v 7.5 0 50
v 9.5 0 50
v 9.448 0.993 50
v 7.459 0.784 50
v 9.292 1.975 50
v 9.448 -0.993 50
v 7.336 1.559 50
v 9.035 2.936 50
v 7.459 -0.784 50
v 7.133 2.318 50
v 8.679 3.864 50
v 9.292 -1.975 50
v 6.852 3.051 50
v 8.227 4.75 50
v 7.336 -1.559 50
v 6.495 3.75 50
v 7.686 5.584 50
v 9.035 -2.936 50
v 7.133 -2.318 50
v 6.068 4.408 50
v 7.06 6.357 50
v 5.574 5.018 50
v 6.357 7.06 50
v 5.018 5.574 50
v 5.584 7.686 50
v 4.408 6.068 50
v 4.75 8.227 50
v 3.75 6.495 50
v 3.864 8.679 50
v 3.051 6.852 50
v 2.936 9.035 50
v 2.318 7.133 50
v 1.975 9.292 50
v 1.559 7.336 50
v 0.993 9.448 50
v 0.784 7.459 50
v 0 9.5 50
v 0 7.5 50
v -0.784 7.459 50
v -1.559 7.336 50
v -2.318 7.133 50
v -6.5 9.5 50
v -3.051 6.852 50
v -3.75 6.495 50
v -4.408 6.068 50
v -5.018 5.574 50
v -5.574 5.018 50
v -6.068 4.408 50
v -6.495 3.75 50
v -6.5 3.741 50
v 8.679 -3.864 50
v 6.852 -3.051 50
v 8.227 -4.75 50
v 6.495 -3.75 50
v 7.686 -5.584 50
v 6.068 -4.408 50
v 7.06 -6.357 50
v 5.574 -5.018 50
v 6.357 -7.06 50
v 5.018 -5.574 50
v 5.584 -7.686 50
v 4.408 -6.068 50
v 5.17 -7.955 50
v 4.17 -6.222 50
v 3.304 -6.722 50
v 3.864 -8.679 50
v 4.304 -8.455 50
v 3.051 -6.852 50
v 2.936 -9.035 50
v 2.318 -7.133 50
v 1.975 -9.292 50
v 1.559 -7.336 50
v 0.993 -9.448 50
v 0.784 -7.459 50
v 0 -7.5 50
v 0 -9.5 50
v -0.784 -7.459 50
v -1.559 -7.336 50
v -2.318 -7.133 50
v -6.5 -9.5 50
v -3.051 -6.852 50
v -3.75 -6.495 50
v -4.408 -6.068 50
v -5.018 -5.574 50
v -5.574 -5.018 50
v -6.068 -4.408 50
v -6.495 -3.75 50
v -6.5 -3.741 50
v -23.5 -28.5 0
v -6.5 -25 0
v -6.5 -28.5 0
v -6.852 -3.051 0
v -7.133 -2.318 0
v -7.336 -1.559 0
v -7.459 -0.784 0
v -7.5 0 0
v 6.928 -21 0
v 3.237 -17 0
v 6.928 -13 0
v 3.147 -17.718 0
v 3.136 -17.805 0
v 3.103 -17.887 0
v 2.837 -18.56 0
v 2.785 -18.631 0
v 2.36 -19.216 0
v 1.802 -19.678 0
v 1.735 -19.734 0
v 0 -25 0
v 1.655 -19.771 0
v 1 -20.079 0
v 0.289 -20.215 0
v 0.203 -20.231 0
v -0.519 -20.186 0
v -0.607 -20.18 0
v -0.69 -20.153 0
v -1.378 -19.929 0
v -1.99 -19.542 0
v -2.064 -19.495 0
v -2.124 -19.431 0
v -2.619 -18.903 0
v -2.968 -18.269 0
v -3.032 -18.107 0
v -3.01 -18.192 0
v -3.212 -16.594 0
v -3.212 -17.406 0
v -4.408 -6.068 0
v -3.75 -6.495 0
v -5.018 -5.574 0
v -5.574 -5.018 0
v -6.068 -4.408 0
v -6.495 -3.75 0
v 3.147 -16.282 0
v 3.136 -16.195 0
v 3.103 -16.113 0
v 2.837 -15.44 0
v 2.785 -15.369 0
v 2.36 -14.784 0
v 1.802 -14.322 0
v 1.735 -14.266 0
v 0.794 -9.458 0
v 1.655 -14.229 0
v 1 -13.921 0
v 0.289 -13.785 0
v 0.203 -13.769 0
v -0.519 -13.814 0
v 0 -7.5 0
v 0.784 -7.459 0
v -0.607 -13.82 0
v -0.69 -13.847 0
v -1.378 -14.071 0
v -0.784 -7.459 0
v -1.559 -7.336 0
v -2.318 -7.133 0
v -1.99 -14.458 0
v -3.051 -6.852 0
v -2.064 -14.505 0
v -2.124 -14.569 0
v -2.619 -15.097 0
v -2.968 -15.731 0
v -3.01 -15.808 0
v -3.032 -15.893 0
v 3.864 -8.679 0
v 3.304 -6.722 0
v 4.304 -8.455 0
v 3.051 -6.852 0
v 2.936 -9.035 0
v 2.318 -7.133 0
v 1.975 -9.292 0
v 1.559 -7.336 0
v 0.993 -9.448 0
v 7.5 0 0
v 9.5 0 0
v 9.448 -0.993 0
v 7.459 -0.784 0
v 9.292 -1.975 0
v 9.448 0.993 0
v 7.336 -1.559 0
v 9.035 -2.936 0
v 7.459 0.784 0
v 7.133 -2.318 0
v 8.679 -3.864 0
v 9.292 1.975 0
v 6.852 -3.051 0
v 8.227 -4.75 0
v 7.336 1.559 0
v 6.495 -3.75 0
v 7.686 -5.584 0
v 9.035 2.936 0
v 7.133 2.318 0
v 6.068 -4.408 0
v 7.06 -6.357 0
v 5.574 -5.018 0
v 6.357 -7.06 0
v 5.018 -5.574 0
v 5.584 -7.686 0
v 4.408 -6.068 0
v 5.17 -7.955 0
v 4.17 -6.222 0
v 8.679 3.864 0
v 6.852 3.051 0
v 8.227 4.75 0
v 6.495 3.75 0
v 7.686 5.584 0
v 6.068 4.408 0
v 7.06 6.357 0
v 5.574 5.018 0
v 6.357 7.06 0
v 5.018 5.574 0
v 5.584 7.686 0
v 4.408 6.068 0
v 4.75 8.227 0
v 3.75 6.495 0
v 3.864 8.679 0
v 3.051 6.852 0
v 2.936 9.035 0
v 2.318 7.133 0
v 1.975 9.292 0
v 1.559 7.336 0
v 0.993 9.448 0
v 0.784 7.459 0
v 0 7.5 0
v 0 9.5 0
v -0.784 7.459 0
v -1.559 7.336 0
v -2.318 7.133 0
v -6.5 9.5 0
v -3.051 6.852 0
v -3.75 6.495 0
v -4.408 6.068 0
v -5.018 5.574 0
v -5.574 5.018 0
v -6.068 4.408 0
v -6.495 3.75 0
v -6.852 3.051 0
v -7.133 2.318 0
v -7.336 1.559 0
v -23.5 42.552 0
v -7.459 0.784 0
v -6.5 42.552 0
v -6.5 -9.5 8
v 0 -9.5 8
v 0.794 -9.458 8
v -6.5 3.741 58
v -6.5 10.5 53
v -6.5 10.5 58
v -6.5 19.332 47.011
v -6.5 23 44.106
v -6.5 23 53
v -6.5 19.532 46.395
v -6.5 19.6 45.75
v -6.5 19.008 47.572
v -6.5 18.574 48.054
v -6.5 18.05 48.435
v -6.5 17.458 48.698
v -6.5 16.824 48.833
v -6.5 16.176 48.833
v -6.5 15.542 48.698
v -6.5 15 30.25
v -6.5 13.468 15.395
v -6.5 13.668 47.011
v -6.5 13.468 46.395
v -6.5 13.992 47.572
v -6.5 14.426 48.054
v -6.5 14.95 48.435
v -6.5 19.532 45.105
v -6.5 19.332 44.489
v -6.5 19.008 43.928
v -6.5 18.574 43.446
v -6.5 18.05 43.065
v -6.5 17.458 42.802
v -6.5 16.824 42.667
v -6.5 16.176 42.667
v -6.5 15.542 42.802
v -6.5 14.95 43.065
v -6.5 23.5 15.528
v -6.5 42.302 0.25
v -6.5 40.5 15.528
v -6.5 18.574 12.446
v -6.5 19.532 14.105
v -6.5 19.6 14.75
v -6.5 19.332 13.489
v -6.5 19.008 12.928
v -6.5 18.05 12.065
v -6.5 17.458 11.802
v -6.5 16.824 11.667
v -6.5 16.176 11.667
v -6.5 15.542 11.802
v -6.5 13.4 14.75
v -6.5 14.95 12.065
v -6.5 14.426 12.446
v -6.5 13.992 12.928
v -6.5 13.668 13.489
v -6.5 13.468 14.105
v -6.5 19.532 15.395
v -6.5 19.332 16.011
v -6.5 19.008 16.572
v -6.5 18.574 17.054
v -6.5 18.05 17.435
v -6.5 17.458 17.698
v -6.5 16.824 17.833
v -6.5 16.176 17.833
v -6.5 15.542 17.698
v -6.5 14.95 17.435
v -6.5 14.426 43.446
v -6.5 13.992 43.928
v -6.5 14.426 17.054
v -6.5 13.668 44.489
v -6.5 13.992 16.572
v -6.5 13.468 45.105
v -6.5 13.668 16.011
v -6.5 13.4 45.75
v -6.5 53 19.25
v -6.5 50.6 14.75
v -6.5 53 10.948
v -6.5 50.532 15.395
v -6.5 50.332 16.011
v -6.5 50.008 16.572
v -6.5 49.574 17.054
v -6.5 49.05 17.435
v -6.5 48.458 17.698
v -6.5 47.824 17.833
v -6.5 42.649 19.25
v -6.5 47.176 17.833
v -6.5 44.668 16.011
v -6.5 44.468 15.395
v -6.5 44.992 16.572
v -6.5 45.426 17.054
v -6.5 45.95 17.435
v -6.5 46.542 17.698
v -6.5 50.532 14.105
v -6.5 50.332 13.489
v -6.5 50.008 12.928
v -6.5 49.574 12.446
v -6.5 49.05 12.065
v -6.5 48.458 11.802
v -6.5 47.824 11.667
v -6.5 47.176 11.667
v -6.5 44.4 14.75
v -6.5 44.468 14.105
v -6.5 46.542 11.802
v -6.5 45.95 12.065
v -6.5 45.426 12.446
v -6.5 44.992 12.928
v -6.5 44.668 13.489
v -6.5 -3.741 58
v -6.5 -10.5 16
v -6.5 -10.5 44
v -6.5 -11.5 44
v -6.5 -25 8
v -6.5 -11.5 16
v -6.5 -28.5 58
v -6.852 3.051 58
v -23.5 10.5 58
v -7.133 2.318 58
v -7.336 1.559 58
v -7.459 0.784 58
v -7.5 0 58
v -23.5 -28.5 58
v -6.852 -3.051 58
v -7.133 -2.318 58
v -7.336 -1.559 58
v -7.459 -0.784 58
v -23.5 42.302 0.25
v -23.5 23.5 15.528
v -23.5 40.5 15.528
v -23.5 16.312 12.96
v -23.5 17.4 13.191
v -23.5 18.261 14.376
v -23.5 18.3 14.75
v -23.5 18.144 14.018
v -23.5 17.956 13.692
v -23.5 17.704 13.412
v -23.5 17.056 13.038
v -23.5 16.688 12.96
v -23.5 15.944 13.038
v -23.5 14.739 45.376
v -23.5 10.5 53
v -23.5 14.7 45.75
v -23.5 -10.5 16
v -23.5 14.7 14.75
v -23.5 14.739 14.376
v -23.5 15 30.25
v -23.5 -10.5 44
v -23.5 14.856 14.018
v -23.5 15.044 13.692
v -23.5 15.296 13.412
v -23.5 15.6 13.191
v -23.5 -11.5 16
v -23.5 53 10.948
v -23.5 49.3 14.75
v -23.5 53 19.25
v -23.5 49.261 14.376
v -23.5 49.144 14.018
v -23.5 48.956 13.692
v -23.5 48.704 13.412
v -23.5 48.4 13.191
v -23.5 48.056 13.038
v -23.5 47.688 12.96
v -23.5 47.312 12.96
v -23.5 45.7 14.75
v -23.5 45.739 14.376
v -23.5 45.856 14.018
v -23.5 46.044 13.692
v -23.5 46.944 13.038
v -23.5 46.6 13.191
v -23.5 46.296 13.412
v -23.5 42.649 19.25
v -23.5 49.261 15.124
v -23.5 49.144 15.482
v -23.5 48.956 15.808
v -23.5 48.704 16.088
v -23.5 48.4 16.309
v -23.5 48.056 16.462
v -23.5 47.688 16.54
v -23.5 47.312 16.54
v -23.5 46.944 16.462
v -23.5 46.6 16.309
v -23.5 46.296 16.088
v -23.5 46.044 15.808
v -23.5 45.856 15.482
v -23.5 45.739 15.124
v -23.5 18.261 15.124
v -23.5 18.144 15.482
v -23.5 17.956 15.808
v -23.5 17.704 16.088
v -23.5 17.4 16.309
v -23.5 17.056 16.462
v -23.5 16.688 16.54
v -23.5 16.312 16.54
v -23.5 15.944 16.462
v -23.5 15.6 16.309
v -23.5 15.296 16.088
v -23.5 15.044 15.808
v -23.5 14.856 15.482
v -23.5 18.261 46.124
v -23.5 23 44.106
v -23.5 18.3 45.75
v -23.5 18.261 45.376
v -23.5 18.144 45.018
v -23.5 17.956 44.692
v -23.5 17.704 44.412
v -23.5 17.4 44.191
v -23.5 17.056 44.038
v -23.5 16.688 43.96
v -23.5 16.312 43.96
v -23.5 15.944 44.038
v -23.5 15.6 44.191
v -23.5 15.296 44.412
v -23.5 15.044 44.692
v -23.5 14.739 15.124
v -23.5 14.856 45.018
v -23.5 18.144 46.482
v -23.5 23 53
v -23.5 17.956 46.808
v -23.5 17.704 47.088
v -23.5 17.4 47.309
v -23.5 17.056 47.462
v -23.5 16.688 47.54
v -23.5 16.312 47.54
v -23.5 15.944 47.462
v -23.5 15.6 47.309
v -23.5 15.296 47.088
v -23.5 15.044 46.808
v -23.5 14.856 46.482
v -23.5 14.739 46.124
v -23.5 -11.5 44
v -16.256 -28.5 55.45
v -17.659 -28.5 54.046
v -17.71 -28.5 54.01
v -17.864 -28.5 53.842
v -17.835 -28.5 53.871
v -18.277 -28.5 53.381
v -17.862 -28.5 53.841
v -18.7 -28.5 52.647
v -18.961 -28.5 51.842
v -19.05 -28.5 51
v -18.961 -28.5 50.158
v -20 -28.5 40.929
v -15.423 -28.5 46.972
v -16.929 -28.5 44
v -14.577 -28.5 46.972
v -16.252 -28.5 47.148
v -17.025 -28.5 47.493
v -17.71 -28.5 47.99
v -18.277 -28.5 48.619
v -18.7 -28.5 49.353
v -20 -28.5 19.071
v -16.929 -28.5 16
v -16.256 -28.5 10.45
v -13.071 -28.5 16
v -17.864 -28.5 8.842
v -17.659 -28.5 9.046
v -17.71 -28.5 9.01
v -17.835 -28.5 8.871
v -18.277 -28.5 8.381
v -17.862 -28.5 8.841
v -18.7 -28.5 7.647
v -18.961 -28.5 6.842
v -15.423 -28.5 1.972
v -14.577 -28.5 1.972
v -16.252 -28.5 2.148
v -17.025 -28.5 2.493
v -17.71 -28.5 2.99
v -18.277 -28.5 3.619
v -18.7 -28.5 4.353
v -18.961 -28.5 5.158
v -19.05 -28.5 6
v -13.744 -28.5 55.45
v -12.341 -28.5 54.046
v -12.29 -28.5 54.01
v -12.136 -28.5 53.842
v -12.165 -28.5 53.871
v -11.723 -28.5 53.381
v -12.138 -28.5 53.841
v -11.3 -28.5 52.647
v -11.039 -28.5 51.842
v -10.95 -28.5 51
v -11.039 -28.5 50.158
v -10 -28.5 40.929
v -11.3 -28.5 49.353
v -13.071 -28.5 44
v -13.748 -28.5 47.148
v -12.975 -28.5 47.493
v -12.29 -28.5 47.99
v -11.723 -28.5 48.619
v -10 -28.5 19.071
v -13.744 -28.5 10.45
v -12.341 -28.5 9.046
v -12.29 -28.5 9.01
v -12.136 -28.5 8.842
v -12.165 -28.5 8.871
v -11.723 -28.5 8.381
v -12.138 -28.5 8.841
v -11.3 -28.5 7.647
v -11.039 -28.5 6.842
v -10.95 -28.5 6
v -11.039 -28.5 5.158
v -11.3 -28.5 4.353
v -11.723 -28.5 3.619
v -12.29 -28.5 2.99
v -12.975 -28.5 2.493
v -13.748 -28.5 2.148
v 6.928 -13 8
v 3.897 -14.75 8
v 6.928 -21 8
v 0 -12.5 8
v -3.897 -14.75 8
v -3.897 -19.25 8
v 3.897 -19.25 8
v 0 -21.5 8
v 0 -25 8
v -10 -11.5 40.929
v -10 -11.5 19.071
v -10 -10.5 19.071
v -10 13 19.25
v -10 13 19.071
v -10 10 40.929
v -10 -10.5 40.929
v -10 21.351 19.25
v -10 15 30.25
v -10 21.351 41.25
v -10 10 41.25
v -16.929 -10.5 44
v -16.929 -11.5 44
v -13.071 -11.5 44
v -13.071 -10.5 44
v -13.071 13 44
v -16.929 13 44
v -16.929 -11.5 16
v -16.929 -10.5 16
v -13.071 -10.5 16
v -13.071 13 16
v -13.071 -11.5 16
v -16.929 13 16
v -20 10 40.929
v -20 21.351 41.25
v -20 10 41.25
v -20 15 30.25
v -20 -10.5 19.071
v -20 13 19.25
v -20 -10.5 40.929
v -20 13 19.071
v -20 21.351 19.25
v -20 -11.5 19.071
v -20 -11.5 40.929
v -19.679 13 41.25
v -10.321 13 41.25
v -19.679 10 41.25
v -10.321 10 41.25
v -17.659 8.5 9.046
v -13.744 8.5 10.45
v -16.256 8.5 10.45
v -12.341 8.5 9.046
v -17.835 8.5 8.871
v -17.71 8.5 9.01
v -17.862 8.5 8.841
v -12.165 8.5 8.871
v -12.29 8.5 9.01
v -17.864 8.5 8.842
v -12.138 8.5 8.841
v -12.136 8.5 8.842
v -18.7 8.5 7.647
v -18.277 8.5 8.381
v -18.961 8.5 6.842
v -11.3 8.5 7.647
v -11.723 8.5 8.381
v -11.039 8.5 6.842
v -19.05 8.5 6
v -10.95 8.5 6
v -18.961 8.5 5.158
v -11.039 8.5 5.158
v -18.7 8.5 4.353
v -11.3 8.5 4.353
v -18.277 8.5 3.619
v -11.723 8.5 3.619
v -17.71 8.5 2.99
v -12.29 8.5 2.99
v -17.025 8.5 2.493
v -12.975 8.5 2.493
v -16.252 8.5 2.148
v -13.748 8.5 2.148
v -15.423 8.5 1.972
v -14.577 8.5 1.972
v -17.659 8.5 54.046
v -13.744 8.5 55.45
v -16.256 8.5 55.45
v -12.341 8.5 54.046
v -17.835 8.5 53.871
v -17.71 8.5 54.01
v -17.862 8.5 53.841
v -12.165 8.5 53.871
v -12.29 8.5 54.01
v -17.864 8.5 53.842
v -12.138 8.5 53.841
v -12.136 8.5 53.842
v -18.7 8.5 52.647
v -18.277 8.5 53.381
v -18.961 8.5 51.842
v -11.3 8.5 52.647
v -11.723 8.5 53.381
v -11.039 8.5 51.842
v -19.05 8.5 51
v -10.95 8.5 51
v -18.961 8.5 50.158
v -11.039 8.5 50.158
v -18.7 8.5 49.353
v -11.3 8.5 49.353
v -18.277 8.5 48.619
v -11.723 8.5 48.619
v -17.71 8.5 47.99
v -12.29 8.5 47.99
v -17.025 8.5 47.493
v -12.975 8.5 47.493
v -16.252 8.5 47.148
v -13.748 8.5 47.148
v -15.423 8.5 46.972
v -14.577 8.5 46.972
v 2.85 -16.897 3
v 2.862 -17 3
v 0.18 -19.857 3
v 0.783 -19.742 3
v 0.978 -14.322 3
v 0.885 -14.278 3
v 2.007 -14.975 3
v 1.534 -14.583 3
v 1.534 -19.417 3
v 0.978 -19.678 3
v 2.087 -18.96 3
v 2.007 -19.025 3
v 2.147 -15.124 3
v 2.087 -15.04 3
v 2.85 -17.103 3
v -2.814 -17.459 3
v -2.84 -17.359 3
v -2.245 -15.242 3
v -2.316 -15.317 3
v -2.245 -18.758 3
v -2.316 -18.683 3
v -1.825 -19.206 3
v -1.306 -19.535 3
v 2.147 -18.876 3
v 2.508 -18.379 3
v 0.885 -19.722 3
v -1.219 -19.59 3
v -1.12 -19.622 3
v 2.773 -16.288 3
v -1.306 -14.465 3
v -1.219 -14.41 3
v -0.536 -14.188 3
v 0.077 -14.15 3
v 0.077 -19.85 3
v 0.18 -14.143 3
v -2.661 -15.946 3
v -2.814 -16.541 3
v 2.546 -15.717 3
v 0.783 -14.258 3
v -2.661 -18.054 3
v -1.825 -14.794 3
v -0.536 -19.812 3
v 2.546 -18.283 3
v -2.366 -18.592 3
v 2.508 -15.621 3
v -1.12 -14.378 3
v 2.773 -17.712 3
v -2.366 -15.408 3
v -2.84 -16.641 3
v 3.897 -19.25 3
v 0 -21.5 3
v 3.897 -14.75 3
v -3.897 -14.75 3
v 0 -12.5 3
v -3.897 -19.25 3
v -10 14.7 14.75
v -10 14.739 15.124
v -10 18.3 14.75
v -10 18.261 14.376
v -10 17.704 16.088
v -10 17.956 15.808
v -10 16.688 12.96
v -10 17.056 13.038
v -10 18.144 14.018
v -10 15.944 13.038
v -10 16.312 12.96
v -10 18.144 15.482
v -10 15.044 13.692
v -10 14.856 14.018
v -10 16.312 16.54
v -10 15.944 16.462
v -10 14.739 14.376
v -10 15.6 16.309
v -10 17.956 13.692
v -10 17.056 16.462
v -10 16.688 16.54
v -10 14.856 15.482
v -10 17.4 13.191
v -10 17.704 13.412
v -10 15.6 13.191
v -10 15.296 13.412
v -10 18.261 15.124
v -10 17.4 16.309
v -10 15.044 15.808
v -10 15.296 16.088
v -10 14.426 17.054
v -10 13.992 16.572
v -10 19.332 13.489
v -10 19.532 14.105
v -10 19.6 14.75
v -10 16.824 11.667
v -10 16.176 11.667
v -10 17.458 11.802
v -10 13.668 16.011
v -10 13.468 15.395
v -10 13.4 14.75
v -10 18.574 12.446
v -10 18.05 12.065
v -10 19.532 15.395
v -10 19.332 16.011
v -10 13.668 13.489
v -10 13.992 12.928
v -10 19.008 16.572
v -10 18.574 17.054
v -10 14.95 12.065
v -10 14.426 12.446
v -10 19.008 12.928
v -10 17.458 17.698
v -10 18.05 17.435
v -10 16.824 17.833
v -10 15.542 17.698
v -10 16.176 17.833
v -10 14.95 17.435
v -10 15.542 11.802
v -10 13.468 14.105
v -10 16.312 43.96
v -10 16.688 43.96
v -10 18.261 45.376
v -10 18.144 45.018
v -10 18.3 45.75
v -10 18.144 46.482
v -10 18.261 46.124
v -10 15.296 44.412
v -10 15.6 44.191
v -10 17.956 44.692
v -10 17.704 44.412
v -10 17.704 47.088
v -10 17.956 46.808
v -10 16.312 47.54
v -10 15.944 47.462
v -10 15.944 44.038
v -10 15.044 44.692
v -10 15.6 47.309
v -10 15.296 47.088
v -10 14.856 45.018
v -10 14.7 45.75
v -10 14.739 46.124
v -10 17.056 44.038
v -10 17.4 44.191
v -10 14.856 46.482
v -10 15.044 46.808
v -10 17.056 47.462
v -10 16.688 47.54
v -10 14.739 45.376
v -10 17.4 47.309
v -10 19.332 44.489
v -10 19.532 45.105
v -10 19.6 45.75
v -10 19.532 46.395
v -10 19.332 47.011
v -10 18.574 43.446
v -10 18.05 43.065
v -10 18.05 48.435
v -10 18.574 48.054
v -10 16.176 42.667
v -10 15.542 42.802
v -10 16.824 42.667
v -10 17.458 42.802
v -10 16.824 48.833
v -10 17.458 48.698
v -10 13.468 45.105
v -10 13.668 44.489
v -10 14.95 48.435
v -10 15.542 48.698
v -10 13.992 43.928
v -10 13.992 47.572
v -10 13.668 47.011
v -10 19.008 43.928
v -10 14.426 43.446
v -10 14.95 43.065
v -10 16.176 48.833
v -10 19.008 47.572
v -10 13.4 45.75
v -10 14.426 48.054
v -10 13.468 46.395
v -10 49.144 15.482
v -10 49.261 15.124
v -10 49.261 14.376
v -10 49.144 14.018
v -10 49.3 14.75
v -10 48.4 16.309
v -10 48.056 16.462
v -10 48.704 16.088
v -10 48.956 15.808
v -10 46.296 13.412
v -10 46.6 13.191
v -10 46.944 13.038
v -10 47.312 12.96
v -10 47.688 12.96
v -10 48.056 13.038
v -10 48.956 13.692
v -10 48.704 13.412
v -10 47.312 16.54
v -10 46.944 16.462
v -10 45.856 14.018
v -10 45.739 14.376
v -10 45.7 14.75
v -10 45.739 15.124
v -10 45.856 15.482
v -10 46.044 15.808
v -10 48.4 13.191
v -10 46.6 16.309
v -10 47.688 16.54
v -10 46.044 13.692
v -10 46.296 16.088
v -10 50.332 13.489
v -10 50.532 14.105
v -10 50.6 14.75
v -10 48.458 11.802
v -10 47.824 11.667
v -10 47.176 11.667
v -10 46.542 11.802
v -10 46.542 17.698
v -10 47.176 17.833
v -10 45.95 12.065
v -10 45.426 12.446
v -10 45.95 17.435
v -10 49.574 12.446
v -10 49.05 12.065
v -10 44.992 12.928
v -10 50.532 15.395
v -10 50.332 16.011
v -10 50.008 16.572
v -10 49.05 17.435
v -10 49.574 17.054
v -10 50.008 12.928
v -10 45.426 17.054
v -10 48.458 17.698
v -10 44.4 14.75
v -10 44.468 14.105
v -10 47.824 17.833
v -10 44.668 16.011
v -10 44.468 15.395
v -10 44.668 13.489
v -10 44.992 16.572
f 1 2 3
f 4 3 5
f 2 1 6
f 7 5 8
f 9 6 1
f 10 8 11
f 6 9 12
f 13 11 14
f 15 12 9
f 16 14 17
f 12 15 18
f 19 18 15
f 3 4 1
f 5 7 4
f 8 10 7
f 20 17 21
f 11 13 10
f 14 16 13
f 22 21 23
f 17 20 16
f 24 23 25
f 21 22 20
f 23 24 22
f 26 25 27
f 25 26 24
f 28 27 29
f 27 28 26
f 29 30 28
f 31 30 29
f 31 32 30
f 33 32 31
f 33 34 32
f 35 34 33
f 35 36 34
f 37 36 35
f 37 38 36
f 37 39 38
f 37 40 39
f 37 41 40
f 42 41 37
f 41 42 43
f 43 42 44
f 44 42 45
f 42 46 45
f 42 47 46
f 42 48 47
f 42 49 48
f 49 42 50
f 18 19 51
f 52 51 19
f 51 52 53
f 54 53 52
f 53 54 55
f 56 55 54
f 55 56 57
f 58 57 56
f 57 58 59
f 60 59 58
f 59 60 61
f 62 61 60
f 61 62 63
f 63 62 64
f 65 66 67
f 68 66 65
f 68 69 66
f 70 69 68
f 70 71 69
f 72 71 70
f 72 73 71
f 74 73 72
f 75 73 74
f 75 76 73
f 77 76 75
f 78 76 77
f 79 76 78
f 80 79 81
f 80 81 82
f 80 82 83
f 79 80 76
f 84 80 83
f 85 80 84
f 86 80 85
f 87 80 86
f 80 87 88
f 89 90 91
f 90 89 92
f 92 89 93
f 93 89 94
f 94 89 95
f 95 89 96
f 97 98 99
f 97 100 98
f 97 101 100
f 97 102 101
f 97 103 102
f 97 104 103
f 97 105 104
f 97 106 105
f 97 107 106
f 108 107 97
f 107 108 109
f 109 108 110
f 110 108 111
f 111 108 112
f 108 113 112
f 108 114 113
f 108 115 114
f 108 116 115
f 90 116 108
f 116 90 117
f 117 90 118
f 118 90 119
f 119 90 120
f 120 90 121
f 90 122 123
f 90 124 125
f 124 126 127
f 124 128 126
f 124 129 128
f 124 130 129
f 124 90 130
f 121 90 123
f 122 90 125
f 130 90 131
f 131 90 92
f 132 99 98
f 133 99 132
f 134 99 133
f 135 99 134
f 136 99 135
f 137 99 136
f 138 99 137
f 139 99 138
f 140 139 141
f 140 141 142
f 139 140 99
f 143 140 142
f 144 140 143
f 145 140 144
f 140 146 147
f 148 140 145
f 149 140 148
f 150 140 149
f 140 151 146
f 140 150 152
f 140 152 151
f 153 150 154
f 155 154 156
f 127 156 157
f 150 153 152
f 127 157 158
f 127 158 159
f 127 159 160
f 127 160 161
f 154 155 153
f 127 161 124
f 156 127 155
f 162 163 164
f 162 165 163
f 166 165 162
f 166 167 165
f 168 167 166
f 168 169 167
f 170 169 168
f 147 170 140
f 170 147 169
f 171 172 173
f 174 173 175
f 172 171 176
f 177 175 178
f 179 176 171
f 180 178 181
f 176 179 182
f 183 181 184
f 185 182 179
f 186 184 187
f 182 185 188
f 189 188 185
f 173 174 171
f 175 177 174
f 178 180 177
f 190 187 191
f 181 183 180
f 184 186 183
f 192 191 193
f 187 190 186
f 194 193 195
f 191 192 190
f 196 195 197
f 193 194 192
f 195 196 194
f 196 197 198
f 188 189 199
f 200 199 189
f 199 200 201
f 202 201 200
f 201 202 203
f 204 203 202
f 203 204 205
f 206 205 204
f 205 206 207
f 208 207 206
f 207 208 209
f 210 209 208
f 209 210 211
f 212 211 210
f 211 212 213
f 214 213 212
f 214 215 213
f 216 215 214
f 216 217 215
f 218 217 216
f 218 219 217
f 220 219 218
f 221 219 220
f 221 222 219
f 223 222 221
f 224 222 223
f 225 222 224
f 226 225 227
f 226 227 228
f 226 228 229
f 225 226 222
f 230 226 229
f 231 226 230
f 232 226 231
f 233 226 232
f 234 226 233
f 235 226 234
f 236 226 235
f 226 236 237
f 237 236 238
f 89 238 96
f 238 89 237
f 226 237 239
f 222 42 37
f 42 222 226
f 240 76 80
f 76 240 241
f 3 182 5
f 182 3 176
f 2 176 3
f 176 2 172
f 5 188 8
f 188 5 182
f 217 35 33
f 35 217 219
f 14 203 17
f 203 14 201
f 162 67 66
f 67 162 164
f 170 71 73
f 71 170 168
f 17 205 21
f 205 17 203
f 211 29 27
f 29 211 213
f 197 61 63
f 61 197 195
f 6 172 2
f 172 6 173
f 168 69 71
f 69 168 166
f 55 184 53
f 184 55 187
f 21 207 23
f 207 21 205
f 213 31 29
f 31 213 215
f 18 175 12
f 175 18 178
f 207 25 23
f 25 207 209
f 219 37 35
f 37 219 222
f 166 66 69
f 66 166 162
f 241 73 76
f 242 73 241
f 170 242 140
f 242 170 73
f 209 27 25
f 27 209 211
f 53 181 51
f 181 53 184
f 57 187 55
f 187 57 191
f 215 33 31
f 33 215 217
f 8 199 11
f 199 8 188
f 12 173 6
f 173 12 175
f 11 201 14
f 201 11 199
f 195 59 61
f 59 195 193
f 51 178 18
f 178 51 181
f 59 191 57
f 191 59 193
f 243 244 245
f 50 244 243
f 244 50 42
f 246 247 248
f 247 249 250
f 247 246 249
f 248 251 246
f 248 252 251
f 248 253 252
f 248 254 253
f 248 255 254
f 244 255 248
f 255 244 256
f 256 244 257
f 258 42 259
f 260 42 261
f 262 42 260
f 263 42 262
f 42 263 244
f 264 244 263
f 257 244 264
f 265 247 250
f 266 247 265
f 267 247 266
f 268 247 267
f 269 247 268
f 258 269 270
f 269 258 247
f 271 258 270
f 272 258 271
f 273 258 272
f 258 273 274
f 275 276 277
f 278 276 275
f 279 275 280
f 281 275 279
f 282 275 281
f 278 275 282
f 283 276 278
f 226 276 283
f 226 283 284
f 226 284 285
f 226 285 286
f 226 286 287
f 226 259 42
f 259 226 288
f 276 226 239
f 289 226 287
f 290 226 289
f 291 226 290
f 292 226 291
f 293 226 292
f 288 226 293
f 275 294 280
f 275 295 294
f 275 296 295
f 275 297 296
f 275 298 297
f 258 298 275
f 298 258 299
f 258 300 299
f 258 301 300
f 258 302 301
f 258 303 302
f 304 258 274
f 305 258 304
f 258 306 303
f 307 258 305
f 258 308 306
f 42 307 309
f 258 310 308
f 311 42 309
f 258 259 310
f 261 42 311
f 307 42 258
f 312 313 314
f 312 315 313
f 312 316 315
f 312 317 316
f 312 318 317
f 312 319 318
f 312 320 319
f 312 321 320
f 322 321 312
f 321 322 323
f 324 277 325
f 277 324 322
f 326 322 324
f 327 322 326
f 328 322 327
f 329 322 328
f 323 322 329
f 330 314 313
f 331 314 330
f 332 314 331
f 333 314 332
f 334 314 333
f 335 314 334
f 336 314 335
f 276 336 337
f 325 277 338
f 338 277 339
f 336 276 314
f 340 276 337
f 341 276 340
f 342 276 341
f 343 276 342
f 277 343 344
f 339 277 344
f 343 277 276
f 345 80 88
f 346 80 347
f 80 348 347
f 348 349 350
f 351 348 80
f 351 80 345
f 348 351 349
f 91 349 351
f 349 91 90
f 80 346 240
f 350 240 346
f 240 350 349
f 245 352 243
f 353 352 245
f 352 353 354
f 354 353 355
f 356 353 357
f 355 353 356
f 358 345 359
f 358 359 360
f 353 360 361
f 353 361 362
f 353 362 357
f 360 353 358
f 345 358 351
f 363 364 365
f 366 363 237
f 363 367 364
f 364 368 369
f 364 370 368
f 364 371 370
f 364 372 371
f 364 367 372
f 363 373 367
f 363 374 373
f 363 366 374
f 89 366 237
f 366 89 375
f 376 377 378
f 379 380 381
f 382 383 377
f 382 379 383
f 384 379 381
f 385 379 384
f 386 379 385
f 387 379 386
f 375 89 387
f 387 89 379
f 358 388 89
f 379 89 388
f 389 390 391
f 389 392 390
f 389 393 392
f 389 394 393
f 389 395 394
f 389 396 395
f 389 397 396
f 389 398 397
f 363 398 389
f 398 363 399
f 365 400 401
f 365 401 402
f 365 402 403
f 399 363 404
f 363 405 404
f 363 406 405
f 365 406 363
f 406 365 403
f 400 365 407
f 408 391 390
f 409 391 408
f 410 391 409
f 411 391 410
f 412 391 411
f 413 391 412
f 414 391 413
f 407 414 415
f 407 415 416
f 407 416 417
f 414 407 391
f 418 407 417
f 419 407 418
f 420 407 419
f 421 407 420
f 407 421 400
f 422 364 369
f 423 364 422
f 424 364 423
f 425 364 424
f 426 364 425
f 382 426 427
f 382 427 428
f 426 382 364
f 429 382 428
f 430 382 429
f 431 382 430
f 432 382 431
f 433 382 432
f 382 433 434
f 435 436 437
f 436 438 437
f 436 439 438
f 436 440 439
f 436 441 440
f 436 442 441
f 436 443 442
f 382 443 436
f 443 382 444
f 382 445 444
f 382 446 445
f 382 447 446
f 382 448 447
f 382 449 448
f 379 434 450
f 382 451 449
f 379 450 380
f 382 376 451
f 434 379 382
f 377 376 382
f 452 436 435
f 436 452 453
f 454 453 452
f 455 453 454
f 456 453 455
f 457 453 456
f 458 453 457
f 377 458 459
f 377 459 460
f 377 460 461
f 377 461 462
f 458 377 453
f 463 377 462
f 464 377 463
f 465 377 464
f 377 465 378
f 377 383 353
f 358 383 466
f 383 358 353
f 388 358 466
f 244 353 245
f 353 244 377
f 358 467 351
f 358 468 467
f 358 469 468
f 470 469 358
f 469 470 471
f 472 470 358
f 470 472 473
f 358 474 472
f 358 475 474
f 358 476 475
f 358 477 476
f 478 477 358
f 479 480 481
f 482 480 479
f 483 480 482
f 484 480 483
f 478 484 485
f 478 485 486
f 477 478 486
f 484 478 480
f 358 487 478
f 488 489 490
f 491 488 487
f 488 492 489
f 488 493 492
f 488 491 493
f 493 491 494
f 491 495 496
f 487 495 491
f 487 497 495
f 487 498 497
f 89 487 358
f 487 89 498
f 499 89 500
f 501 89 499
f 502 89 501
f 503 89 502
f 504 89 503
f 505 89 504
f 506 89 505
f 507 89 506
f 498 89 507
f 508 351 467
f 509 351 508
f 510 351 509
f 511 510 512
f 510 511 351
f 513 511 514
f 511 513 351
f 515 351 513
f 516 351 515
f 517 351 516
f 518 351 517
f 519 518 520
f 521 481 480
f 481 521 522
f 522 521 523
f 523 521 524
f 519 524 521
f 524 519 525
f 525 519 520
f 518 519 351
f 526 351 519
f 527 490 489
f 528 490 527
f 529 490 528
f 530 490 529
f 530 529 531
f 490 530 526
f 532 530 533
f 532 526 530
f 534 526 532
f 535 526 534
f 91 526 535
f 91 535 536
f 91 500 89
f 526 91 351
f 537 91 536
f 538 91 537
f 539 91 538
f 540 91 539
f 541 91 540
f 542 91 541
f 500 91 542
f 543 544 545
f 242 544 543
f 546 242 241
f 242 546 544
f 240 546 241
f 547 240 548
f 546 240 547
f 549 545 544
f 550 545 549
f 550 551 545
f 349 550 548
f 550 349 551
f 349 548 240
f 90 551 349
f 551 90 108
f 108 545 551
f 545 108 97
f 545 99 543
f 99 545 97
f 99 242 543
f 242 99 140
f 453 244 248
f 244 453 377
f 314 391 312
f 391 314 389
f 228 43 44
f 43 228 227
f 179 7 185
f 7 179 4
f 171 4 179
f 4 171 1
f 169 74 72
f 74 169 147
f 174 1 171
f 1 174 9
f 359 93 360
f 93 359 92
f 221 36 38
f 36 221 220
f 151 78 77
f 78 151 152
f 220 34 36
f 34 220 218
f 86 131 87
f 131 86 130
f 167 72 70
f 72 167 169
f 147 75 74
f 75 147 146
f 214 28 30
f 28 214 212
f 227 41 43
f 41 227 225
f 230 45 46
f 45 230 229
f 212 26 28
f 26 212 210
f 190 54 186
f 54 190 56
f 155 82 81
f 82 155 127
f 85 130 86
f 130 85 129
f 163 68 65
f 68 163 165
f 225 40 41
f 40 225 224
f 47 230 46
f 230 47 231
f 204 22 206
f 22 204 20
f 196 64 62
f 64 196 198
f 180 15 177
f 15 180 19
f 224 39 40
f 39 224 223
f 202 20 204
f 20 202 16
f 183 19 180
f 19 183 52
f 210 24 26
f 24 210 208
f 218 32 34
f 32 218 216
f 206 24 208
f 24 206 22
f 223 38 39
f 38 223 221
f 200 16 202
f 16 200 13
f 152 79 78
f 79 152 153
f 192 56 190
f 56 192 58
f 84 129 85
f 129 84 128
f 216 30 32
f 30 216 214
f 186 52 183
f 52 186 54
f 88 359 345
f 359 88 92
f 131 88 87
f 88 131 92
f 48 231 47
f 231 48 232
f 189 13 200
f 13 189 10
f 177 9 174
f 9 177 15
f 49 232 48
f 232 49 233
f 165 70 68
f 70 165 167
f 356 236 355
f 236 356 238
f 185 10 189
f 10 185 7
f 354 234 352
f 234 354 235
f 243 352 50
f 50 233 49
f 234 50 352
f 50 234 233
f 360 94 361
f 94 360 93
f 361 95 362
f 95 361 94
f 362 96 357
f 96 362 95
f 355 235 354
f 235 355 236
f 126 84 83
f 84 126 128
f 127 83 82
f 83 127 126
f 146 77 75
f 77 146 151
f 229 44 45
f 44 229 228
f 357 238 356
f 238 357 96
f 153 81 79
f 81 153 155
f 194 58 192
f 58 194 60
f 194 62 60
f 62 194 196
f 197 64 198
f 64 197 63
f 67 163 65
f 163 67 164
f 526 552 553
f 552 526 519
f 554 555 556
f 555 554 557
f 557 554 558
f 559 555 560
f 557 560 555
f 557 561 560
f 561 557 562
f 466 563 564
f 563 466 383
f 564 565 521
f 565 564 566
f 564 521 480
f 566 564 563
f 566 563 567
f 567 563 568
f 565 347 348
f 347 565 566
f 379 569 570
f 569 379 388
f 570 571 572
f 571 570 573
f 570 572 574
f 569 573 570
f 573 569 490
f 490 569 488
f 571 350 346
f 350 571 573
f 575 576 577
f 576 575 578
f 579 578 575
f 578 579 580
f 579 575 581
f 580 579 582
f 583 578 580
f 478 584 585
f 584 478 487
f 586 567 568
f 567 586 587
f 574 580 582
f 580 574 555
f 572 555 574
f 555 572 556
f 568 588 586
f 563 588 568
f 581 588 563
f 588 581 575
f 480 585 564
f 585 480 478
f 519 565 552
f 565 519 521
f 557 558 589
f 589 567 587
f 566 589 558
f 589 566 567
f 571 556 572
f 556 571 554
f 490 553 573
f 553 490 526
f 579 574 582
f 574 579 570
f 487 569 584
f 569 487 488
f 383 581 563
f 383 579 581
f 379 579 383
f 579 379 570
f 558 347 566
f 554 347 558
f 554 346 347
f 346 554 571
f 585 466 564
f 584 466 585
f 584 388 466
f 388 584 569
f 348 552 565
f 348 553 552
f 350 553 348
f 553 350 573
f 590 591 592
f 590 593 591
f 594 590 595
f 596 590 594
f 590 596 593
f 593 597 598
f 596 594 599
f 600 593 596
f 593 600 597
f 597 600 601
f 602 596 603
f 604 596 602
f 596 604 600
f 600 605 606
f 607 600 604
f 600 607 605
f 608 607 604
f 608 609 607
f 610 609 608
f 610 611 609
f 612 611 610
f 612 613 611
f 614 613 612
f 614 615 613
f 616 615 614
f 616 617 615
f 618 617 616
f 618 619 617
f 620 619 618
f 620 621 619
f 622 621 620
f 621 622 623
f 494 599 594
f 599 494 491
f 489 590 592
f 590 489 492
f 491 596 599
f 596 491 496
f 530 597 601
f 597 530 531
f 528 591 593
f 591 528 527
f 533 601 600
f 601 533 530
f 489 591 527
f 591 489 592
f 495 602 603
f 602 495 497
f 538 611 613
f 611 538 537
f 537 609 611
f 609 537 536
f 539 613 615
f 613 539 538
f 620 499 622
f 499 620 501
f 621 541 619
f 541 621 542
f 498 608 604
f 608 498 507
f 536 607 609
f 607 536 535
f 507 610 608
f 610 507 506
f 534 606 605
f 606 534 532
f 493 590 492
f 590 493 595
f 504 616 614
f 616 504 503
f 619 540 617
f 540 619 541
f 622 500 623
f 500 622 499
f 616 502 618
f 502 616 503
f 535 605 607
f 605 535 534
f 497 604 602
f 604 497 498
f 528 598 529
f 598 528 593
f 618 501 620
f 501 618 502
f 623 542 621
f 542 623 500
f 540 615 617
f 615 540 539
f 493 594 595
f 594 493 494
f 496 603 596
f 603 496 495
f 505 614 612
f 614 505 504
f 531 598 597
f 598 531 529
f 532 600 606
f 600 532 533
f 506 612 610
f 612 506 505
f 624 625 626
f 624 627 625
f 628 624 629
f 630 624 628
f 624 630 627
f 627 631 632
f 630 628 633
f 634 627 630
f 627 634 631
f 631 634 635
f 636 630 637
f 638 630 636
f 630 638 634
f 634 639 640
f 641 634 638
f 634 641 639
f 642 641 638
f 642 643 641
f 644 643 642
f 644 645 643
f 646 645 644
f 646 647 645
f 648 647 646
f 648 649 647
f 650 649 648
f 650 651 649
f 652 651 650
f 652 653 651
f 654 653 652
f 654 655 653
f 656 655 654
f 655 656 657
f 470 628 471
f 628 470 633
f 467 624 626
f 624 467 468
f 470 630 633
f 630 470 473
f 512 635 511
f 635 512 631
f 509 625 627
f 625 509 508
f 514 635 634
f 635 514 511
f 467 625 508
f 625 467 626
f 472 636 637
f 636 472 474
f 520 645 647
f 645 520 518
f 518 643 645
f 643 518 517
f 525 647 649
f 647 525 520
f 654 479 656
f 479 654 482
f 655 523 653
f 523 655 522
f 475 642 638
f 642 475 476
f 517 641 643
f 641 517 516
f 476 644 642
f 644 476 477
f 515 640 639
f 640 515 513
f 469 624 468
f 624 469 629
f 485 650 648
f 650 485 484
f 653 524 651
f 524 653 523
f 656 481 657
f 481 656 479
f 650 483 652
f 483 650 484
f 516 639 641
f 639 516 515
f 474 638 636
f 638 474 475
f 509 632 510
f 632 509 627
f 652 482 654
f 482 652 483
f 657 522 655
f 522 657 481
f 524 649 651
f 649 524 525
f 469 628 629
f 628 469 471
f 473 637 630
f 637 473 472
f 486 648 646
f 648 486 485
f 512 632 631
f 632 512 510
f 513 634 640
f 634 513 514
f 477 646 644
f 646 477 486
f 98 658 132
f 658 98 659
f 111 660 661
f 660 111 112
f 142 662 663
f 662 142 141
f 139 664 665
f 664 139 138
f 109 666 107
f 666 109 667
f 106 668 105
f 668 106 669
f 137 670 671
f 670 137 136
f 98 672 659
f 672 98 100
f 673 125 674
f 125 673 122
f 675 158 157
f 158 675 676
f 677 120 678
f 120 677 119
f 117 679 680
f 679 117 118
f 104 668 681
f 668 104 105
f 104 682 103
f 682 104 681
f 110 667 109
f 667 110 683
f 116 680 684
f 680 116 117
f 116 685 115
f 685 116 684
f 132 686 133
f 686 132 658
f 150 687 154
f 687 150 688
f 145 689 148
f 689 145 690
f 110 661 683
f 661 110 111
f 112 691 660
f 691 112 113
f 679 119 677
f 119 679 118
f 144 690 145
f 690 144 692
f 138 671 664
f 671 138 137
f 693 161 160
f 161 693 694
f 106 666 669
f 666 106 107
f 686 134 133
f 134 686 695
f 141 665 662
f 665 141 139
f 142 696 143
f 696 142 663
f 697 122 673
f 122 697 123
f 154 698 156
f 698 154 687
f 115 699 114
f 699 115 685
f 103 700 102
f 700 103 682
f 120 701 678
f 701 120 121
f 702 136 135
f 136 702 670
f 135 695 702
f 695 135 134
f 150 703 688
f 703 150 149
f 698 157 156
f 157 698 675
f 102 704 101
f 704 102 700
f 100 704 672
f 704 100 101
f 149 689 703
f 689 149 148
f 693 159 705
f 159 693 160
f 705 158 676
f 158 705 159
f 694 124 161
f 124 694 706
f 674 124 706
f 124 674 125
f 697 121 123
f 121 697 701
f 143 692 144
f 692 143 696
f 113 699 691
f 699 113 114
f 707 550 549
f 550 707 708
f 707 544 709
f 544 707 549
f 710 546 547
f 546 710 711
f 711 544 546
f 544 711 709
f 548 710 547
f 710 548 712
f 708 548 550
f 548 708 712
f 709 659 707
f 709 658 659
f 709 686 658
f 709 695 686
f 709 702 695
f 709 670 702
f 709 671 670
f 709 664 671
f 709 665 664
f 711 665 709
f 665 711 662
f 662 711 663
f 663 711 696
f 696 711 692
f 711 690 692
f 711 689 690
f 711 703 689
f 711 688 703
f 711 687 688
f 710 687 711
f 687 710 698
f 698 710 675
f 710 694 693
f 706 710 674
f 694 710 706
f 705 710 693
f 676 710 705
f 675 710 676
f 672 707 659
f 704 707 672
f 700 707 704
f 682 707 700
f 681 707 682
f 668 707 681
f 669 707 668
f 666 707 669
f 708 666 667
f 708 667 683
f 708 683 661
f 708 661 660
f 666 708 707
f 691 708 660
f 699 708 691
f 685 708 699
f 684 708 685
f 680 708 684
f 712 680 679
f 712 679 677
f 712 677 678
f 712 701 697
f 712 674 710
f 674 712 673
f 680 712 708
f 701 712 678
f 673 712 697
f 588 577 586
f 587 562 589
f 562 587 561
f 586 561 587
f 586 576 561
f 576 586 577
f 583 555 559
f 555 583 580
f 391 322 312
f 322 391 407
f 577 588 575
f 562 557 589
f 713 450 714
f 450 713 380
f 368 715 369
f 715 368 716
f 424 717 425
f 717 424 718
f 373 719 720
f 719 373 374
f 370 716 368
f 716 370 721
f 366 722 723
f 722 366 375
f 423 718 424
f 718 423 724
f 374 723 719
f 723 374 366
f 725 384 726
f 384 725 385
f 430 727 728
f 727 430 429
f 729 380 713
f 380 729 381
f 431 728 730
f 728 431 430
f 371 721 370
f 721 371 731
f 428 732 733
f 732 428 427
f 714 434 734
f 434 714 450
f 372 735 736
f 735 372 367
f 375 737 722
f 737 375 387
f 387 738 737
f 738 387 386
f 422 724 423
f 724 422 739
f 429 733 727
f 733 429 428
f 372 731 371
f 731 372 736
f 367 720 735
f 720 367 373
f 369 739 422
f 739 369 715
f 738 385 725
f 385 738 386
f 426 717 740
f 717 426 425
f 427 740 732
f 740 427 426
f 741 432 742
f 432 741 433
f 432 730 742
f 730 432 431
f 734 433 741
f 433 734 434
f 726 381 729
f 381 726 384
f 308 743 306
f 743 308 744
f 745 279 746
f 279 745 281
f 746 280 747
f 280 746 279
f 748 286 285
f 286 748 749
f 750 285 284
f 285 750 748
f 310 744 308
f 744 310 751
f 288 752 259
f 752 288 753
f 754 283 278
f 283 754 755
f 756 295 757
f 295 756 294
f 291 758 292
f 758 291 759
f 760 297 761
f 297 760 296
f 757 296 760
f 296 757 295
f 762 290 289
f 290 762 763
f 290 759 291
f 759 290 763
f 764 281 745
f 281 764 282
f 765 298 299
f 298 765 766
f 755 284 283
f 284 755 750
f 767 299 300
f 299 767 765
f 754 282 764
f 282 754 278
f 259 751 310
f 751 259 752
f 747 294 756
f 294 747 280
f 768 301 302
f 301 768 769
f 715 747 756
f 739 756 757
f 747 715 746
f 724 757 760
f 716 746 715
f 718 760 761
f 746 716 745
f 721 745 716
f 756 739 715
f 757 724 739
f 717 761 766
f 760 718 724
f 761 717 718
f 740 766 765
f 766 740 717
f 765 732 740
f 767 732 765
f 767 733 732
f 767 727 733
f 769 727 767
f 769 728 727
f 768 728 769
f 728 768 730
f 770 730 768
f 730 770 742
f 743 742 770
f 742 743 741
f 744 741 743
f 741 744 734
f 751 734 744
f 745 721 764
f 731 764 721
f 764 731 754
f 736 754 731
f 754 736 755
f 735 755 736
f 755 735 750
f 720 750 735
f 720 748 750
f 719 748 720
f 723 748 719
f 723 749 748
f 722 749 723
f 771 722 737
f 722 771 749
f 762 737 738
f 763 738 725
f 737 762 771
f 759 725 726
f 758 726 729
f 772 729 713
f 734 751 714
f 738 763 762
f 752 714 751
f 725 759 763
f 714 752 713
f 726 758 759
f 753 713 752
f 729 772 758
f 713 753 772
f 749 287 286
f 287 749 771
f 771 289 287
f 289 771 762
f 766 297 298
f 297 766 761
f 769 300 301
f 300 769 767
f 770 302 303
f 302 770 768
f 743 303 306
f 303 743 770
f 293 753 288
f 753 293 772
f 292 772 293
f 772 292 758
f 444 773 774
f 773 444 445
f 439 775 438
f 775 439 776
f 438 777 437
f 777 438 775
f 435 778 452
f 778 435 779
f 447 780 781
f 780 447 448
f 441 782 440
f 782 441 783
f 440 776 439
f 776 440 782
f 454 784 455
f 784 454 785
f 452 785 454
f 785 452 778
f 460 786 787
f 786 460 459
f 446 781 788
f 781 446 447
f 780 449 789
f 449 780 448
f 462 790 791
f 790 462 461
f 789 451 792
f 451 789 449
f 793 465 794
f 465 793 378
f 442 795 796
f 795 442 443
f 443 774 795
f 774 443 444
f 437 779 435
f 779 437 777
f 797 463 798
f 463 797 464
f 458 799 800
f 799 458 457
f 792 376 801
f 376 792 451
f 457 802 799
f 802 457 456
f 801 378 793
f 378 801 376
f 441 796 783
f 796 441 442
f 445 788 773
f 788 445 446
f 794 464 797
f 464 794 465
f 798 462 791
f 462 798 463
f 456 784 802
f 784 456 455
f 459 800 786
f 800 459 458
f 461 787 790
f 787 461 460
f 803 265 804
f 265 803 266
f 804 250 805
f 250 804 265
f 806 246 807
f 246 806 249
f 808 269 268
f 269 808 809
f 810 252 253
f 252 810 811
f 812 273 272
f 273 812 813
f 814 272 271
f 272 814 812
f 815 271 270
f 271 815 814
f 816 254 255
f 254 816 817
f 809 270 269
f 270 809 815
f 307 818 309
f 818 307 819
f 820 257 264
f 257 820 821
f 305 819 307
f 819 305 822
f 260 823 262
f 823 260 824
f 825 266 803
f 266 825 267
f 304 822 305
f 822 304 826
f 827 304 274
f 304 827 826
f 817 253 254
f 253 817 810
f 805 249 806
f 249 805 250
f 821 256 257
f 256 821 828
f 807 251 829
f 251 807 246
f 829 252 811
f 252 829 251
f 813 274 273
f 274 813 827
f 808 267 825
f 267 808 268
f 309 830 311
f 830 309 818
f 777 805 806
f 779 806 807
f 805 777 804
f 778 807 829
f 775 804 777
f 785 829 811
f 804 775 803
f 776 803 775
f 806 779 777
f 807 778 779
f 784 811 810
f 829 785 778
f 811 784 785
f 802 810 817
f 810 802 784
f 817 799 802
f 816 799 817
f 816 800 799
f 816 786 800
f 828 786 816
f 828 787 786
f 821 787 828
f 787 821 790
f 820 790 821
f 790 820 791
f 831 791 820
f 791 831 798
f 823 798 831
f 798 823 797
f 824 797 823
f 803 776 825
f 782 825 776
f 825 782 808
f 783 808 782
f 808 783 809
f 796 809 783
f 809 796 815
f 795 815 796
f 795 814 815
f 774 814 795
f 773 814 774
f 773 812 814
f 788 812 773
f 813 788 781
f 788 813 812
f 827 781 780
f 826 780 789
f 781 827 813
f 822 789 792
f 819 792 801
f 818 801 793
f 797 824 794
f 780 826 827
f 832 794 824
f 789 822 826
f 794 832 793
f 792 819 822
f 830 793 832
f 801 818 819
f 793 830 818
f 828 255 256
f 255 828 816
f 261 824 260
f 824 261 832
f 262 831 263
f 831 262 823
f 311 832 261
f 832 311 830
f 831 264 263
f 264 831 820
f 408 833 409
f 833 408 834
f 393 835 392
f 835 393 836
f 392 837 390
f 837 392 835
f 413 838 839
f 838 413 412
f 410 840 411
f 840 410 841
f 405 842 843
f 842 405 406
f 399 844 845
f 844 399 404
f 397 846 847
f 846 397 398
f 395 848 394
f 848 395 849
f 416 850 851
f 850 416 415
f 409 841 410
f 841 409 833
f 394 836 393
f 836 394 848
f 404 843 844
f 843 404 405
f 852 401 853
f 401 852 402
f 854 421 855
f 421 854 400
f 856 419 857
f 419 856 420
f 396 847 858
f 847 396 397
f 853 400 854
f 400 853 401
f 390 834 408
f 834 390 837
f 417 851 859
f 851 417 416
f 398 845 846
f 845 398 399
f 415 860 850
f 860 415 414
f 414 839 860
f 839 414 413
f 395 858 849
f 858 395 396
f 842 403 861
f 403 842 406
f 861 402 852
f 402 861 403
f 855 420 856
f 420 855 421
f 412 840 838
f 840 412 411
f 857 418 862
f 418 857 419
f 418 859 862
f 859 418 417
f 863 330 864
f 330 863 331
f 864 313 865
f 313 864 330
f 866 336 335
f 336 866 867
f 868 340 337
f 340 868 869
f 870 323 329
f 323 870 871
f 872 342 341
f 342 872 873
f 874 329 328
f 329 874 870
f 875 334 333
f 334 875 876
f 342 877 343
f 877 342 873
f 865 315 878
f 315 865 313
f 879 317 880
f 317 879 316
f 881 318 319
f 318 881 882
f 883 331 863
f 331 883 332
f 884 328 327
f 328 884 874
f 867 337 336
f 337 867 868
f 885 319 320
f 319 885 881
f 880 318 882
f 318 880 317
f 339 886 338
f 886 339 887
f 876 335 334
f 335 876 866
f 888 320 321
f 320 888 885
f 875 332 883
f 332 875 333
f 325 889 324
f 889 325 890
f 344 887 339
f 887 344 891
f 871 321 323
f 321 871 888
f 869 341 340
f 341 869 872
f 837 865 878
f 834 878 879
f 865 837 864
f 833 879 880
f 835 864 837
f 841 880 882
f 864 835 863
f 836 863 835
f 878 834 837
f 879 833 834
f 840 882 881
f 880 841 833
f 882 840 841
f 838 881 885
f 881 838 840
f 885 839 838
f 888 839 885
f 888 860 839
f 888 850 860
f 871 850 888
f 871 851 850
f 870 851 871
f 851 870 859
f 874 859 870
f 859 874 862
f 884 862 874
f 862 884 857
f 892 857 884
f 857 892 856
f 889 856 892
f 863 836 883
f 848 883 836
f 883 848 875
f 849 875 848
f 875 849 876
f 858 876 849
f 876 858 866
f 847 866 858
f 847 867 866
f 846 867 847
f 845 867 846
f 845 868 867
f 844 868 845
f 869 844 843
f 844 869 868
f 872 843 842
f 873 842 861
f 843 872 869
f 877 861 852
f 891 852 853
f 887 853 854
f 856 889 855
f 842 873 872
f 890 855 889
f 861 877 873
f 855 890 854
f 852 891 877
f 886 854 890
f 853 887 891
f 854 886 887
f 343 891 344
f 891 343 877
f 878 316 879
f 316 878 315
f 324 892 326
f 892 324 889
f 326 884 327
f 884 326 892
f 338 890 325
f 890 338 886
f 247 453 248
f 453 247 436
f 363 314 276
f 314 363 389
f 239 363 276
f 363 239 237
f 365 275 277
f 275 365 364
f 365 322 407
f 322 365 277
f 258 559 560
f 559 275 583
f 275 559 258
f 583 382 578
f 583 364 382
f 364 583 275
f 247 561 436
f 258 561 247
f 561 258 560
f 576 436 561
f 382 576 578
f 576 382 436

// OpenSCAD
// file: inc/inc/bearing.scad
// PRUSA iteration3
// Bearing holders
// GNU GPL v3
// Josef Průša <iam@josefprusa.cz> and contributors
// http://www.reprap.org/wiki/Prusa_Mendel
// http://prusamendel.org

bearing_diameter = 15;

module horizontal_bearing_base(bearings=1){
 translate(v=[0,0,8/2]) cube(size = [24,8+bearings*25,8], center = true);	
}
module horizontal_bearing_holes(bearings=1){
 cutter_lenght = 10+bearings*25;
 one_holder_lenght = 8+25;
 holder_lenght = 8+bearings*25;
 
 // Main bearing cut
 difference(){
  translate(v=[0,0,12]) rotate(a=[90,0,0]) translate(v=[0,0,-cutter_lenght/2]) cylinder(h = cutter_lenght, r=bearing_diameter/2, $fn=50);
  // Bearing retainers
  translate(v=[0,1-holder_lenght/2,3]) cube(size = [24,6,8], center = true);
  translate(v=[0,-1+holder_lenght/2,3]) cube(size = [24,6,8], center = true);
 }
 
 // Ziptie cutouts
 ziptie_cut_ofset = 0;
 for ( i = [0 : bearings-1] ){
  // For easier positioning I move them by half of one 
  // bearing holder then add each bearign lenght and then center again
  translate(v=[0,-holder_lenght/2,0]) translate(v=[0,one_holder_lenght/2+i*25,0]) difference(){
   union(){
    translate(v=[0,2-6,12]) rotate(a=[90,0,0]) translate(v=[0,0,0]) cylinder(h = 4, r=12.5, $fn=50);
    translate(v=[0,2+6,12]) rotate(a=[90,0,0]) translate(v=[0,0,0]) cylinder(h = 4, r=12.5, $fn=50);
   }
   translate(v=[0,10,12]) rotate(a=[90,0,0]) translate(v=[0,0,0]) cylinder(h = 24, r=10, $fn=50);
  }
 }
 
}

*difference() {
horizontal_bearing_base();
horizontal_bearing_holes();
}

module horizontal_bearing_test(){
 difference(){
  horizontal_bearing_base(1);
  horizontal_bearing_holes(1);
 }
 translate(v=[30,0,0]) difference(){
  horizontal_bearing_base(2);
  horizontal_bearing_holes(2);
 }
 translate(v=[60,0,0]) difference(){
  horizontal_bearing_base(3);
  horizontal_bearing_holes(3);
 }
}


vertical_bearing_height = 50;

thinwall = 2;
bearing_size = bearing_diameter + 2 * thinwall;

module vertical_bearing_base(){
 translate(v=[-2-bearing_size/4,0,vertical_bearing_height/2]) cube(size = [4+bearing_size/2,bearing_size,vertical_bearing_height], center = true);
 cylinder(h = vertical_bearing_height, r=bearing_size/2, $fn = 60);
}

module vertical_bearing_holes(){
  translate(v=[0,0,-1]) cylinder(h = vertical_bearing_height+10, r=bearing_diameter/2, $fn = 60);
  rotate(a=[0,0,-60]) translate(v=[10,0,vertical_bearing_height/2+1]) cube(size = [10,1,vertical_bearing_height+2], center = true);
}

difference(){
vertical_bearing_base();
vertical_bearing_holes();
}
// file: inc/x-end.scad
// PRUSA iteration3
// X end prototype
// GNU GPL v3
// Josef Průša <iam@josefprusa.cz> and contributors
// http://www.reprap.org/wiki/Prusa_Mendel
// http://prusamendel.org

use <inc/bearing.scad>
rod_distance = 45;

module x_end_base(){
// Main block
height = 58;
translate(v=[-15,-9,height/2]) cube(size = [17,39,height], center = true);
// Bearing holder
 vertical_bearing_base();	
//Nut trap
 // Cube
 translate(v=[-2-2,-17,4]) cube(size = [8,16,8], center = true);
 // Hexagon
 translate(v=[0,-17,0]) rotate([0,0,30]) cylinder(h = 8, r=8, $fn = 6);
}

module x_end_holes(){
 vertical_bearing_holes();
// Belt hole
translate(v=[-1,0,0]){
// Stress relief
translate(v=[-5.5-10+1.5,-10-1,30]) cube(size = [20,1,28], center = true);
difference(){
	translate(v=[-5.5-10+1.5,-10,30]) cube(size = [10,46,28], center = true);

	

	// Nice edges
	translate(v=[-5.5-10+1.5,-10,30+23]) rotate([0,45,0]) cube(size = [10,46,28], center = true);
	translate(v=[-5.5-10+1.5,-10,30+23]) rotate([0,-45,0]) cube(size = [10,46,28], center = true);
	translate(v=[-5.5-10+1.5,-10,30-23]) rotate([0,45,0]) cube(size = [10,46,28], center = true);
	translate(v=[-5.5-10+1.5,-10,30-23]) rotate([0,-45,0]) cube(size = [10,46,28], center = true);

}
}

// Bottom pushfit rod
translate(v=[-15,-41.5,6]) rotate(a=[-90,0,0]) pushfit_rod(8.1,50);
// Top pushfit rod
translate(v=[-15,-41.5,rod_distance+6]) rotate(a=[-90,0,0]) pushfit_rod(8.1,50);
// Nut trap
 translate(v=[0,-17,-0.5]) cylinder(h = 4, r1=3.3, r2=2.8, $fn=25);
 translate(v=[0,-17,3]) rotate([0,0,30]) cylinder(h = 10, r=4.5, $fn = 6);
}


// Final prototype
module x_end_plain(){
 difference(){
  x_end_base();
  x_end_holes();
 }
}

x_end_plain();


module pushfit_rod(diameter,length){
 cylinder(h = length, r=diameter/2, $fn=30);
 difference(){
 	translate(v=[0,-diameter/2.85,length/2]) rotate([0,0,45]) cube(size = [diameter/2,diameter/2,length], center = true);
 	translate(v=[0,-diameter/4-diameter/2-0.4,length/2]) rotate([0,0,0]) cube(size = [diameter,diameter/2,length], center = true);
 }
 //translate(v=[0,-diameter/2-2,length/2]) cube(size = [diameter,1,length], center = true);
}
// main file
// PRUSA iteration3
// X end motor
// GNU GPL v3
// Josef Průša <iam@josefprusa.cz> and contributors
// http://www.reprap.org/wiki/Prusa_Mendel
// http://prusamendel.org

use <inc/x-end.scad>

module x_end_motor_base(){
 x_end_base();
 translate(v=[-15,31,26.5]) cube(size = [17,44,53], center = true);
}

module x_end_motor_holes(){
 x_end_holes();
 // Position to place
 translate(v=[-1,32,30.25]){
  // Belt hole
  translate(v=[-14,1,0]) cube(size = [10,46,22], center = true);
  // Motor mounting holes
  translate(v=[20,-15.5,-15.5]) rotate(a=[0,-90,0]) rotate(a=[0,0,90]) cylinder(h = 70, r=1.8, $fn=30);
  translate(v=[1,-15.5,-15.5]) rotate(a=[0,-90,0]) rotate(a=[0,0,90]) cylinder(h = 10, r=3.1, $fn=30);
 

  translate(v=[20,-15.5,15.5]) rotate(a=[0,-90,0]) rotate(a=[0,0,90]) cylinder(h = 70, r=1.8, $fn=30);
  translate(v=[1,-15.5,15.5]) rotate(a=[0,-90,0]) rotate(a=[0,0,90]) cylinder(h = 10, r=3.1, $fn=30);


  translate(v=[20,15.5,-15.5]) rotate(a=[0,-90,0]) rotate(a=[0,0,90]) cylinder(h = 70, r=1.8, $fn=30);
  translate(v=[1,15.5,-15.5]) rotate(a=[0,-90,0]) rotate(a=[0,0,90]) cylinder(h = 10, r=3.1, $fn=30);


  translate(v=[20,15.5,15.5]) rotate(a=[0,-90,0]) rotate(a=[0,0,90]) cylinder(h = 70, r=1.8, $fn=30);
  translate(v=[1,15.5,15.5]) rotate(a=[0,-90,0]) rotate(a=[0,0,90]) cylinder(h = 10, r=3.1, $fn=30);

  // Material saving cutout 
  translate(v=[-10,12,10]) cube(size = [60,42,42], center = true);

  // Material saving cutout
  translate(v=[-10,40,-30]) rotate(a=[45,0,0])  cube(size = [60,42,42], center = true);
  // Motor shaft cutout
  translate(v=[0,0,0]) rotate(a=[0,-90,0]) rotate(a=[0,0,90]) cylinder(h = 70, r=17, $fn=6);
 }
}

// Final part
module x_end_motor(){
 difference(){
  x_end_motor_base();
  x_end_motor_holes();
 }
}

x_end_motor();
